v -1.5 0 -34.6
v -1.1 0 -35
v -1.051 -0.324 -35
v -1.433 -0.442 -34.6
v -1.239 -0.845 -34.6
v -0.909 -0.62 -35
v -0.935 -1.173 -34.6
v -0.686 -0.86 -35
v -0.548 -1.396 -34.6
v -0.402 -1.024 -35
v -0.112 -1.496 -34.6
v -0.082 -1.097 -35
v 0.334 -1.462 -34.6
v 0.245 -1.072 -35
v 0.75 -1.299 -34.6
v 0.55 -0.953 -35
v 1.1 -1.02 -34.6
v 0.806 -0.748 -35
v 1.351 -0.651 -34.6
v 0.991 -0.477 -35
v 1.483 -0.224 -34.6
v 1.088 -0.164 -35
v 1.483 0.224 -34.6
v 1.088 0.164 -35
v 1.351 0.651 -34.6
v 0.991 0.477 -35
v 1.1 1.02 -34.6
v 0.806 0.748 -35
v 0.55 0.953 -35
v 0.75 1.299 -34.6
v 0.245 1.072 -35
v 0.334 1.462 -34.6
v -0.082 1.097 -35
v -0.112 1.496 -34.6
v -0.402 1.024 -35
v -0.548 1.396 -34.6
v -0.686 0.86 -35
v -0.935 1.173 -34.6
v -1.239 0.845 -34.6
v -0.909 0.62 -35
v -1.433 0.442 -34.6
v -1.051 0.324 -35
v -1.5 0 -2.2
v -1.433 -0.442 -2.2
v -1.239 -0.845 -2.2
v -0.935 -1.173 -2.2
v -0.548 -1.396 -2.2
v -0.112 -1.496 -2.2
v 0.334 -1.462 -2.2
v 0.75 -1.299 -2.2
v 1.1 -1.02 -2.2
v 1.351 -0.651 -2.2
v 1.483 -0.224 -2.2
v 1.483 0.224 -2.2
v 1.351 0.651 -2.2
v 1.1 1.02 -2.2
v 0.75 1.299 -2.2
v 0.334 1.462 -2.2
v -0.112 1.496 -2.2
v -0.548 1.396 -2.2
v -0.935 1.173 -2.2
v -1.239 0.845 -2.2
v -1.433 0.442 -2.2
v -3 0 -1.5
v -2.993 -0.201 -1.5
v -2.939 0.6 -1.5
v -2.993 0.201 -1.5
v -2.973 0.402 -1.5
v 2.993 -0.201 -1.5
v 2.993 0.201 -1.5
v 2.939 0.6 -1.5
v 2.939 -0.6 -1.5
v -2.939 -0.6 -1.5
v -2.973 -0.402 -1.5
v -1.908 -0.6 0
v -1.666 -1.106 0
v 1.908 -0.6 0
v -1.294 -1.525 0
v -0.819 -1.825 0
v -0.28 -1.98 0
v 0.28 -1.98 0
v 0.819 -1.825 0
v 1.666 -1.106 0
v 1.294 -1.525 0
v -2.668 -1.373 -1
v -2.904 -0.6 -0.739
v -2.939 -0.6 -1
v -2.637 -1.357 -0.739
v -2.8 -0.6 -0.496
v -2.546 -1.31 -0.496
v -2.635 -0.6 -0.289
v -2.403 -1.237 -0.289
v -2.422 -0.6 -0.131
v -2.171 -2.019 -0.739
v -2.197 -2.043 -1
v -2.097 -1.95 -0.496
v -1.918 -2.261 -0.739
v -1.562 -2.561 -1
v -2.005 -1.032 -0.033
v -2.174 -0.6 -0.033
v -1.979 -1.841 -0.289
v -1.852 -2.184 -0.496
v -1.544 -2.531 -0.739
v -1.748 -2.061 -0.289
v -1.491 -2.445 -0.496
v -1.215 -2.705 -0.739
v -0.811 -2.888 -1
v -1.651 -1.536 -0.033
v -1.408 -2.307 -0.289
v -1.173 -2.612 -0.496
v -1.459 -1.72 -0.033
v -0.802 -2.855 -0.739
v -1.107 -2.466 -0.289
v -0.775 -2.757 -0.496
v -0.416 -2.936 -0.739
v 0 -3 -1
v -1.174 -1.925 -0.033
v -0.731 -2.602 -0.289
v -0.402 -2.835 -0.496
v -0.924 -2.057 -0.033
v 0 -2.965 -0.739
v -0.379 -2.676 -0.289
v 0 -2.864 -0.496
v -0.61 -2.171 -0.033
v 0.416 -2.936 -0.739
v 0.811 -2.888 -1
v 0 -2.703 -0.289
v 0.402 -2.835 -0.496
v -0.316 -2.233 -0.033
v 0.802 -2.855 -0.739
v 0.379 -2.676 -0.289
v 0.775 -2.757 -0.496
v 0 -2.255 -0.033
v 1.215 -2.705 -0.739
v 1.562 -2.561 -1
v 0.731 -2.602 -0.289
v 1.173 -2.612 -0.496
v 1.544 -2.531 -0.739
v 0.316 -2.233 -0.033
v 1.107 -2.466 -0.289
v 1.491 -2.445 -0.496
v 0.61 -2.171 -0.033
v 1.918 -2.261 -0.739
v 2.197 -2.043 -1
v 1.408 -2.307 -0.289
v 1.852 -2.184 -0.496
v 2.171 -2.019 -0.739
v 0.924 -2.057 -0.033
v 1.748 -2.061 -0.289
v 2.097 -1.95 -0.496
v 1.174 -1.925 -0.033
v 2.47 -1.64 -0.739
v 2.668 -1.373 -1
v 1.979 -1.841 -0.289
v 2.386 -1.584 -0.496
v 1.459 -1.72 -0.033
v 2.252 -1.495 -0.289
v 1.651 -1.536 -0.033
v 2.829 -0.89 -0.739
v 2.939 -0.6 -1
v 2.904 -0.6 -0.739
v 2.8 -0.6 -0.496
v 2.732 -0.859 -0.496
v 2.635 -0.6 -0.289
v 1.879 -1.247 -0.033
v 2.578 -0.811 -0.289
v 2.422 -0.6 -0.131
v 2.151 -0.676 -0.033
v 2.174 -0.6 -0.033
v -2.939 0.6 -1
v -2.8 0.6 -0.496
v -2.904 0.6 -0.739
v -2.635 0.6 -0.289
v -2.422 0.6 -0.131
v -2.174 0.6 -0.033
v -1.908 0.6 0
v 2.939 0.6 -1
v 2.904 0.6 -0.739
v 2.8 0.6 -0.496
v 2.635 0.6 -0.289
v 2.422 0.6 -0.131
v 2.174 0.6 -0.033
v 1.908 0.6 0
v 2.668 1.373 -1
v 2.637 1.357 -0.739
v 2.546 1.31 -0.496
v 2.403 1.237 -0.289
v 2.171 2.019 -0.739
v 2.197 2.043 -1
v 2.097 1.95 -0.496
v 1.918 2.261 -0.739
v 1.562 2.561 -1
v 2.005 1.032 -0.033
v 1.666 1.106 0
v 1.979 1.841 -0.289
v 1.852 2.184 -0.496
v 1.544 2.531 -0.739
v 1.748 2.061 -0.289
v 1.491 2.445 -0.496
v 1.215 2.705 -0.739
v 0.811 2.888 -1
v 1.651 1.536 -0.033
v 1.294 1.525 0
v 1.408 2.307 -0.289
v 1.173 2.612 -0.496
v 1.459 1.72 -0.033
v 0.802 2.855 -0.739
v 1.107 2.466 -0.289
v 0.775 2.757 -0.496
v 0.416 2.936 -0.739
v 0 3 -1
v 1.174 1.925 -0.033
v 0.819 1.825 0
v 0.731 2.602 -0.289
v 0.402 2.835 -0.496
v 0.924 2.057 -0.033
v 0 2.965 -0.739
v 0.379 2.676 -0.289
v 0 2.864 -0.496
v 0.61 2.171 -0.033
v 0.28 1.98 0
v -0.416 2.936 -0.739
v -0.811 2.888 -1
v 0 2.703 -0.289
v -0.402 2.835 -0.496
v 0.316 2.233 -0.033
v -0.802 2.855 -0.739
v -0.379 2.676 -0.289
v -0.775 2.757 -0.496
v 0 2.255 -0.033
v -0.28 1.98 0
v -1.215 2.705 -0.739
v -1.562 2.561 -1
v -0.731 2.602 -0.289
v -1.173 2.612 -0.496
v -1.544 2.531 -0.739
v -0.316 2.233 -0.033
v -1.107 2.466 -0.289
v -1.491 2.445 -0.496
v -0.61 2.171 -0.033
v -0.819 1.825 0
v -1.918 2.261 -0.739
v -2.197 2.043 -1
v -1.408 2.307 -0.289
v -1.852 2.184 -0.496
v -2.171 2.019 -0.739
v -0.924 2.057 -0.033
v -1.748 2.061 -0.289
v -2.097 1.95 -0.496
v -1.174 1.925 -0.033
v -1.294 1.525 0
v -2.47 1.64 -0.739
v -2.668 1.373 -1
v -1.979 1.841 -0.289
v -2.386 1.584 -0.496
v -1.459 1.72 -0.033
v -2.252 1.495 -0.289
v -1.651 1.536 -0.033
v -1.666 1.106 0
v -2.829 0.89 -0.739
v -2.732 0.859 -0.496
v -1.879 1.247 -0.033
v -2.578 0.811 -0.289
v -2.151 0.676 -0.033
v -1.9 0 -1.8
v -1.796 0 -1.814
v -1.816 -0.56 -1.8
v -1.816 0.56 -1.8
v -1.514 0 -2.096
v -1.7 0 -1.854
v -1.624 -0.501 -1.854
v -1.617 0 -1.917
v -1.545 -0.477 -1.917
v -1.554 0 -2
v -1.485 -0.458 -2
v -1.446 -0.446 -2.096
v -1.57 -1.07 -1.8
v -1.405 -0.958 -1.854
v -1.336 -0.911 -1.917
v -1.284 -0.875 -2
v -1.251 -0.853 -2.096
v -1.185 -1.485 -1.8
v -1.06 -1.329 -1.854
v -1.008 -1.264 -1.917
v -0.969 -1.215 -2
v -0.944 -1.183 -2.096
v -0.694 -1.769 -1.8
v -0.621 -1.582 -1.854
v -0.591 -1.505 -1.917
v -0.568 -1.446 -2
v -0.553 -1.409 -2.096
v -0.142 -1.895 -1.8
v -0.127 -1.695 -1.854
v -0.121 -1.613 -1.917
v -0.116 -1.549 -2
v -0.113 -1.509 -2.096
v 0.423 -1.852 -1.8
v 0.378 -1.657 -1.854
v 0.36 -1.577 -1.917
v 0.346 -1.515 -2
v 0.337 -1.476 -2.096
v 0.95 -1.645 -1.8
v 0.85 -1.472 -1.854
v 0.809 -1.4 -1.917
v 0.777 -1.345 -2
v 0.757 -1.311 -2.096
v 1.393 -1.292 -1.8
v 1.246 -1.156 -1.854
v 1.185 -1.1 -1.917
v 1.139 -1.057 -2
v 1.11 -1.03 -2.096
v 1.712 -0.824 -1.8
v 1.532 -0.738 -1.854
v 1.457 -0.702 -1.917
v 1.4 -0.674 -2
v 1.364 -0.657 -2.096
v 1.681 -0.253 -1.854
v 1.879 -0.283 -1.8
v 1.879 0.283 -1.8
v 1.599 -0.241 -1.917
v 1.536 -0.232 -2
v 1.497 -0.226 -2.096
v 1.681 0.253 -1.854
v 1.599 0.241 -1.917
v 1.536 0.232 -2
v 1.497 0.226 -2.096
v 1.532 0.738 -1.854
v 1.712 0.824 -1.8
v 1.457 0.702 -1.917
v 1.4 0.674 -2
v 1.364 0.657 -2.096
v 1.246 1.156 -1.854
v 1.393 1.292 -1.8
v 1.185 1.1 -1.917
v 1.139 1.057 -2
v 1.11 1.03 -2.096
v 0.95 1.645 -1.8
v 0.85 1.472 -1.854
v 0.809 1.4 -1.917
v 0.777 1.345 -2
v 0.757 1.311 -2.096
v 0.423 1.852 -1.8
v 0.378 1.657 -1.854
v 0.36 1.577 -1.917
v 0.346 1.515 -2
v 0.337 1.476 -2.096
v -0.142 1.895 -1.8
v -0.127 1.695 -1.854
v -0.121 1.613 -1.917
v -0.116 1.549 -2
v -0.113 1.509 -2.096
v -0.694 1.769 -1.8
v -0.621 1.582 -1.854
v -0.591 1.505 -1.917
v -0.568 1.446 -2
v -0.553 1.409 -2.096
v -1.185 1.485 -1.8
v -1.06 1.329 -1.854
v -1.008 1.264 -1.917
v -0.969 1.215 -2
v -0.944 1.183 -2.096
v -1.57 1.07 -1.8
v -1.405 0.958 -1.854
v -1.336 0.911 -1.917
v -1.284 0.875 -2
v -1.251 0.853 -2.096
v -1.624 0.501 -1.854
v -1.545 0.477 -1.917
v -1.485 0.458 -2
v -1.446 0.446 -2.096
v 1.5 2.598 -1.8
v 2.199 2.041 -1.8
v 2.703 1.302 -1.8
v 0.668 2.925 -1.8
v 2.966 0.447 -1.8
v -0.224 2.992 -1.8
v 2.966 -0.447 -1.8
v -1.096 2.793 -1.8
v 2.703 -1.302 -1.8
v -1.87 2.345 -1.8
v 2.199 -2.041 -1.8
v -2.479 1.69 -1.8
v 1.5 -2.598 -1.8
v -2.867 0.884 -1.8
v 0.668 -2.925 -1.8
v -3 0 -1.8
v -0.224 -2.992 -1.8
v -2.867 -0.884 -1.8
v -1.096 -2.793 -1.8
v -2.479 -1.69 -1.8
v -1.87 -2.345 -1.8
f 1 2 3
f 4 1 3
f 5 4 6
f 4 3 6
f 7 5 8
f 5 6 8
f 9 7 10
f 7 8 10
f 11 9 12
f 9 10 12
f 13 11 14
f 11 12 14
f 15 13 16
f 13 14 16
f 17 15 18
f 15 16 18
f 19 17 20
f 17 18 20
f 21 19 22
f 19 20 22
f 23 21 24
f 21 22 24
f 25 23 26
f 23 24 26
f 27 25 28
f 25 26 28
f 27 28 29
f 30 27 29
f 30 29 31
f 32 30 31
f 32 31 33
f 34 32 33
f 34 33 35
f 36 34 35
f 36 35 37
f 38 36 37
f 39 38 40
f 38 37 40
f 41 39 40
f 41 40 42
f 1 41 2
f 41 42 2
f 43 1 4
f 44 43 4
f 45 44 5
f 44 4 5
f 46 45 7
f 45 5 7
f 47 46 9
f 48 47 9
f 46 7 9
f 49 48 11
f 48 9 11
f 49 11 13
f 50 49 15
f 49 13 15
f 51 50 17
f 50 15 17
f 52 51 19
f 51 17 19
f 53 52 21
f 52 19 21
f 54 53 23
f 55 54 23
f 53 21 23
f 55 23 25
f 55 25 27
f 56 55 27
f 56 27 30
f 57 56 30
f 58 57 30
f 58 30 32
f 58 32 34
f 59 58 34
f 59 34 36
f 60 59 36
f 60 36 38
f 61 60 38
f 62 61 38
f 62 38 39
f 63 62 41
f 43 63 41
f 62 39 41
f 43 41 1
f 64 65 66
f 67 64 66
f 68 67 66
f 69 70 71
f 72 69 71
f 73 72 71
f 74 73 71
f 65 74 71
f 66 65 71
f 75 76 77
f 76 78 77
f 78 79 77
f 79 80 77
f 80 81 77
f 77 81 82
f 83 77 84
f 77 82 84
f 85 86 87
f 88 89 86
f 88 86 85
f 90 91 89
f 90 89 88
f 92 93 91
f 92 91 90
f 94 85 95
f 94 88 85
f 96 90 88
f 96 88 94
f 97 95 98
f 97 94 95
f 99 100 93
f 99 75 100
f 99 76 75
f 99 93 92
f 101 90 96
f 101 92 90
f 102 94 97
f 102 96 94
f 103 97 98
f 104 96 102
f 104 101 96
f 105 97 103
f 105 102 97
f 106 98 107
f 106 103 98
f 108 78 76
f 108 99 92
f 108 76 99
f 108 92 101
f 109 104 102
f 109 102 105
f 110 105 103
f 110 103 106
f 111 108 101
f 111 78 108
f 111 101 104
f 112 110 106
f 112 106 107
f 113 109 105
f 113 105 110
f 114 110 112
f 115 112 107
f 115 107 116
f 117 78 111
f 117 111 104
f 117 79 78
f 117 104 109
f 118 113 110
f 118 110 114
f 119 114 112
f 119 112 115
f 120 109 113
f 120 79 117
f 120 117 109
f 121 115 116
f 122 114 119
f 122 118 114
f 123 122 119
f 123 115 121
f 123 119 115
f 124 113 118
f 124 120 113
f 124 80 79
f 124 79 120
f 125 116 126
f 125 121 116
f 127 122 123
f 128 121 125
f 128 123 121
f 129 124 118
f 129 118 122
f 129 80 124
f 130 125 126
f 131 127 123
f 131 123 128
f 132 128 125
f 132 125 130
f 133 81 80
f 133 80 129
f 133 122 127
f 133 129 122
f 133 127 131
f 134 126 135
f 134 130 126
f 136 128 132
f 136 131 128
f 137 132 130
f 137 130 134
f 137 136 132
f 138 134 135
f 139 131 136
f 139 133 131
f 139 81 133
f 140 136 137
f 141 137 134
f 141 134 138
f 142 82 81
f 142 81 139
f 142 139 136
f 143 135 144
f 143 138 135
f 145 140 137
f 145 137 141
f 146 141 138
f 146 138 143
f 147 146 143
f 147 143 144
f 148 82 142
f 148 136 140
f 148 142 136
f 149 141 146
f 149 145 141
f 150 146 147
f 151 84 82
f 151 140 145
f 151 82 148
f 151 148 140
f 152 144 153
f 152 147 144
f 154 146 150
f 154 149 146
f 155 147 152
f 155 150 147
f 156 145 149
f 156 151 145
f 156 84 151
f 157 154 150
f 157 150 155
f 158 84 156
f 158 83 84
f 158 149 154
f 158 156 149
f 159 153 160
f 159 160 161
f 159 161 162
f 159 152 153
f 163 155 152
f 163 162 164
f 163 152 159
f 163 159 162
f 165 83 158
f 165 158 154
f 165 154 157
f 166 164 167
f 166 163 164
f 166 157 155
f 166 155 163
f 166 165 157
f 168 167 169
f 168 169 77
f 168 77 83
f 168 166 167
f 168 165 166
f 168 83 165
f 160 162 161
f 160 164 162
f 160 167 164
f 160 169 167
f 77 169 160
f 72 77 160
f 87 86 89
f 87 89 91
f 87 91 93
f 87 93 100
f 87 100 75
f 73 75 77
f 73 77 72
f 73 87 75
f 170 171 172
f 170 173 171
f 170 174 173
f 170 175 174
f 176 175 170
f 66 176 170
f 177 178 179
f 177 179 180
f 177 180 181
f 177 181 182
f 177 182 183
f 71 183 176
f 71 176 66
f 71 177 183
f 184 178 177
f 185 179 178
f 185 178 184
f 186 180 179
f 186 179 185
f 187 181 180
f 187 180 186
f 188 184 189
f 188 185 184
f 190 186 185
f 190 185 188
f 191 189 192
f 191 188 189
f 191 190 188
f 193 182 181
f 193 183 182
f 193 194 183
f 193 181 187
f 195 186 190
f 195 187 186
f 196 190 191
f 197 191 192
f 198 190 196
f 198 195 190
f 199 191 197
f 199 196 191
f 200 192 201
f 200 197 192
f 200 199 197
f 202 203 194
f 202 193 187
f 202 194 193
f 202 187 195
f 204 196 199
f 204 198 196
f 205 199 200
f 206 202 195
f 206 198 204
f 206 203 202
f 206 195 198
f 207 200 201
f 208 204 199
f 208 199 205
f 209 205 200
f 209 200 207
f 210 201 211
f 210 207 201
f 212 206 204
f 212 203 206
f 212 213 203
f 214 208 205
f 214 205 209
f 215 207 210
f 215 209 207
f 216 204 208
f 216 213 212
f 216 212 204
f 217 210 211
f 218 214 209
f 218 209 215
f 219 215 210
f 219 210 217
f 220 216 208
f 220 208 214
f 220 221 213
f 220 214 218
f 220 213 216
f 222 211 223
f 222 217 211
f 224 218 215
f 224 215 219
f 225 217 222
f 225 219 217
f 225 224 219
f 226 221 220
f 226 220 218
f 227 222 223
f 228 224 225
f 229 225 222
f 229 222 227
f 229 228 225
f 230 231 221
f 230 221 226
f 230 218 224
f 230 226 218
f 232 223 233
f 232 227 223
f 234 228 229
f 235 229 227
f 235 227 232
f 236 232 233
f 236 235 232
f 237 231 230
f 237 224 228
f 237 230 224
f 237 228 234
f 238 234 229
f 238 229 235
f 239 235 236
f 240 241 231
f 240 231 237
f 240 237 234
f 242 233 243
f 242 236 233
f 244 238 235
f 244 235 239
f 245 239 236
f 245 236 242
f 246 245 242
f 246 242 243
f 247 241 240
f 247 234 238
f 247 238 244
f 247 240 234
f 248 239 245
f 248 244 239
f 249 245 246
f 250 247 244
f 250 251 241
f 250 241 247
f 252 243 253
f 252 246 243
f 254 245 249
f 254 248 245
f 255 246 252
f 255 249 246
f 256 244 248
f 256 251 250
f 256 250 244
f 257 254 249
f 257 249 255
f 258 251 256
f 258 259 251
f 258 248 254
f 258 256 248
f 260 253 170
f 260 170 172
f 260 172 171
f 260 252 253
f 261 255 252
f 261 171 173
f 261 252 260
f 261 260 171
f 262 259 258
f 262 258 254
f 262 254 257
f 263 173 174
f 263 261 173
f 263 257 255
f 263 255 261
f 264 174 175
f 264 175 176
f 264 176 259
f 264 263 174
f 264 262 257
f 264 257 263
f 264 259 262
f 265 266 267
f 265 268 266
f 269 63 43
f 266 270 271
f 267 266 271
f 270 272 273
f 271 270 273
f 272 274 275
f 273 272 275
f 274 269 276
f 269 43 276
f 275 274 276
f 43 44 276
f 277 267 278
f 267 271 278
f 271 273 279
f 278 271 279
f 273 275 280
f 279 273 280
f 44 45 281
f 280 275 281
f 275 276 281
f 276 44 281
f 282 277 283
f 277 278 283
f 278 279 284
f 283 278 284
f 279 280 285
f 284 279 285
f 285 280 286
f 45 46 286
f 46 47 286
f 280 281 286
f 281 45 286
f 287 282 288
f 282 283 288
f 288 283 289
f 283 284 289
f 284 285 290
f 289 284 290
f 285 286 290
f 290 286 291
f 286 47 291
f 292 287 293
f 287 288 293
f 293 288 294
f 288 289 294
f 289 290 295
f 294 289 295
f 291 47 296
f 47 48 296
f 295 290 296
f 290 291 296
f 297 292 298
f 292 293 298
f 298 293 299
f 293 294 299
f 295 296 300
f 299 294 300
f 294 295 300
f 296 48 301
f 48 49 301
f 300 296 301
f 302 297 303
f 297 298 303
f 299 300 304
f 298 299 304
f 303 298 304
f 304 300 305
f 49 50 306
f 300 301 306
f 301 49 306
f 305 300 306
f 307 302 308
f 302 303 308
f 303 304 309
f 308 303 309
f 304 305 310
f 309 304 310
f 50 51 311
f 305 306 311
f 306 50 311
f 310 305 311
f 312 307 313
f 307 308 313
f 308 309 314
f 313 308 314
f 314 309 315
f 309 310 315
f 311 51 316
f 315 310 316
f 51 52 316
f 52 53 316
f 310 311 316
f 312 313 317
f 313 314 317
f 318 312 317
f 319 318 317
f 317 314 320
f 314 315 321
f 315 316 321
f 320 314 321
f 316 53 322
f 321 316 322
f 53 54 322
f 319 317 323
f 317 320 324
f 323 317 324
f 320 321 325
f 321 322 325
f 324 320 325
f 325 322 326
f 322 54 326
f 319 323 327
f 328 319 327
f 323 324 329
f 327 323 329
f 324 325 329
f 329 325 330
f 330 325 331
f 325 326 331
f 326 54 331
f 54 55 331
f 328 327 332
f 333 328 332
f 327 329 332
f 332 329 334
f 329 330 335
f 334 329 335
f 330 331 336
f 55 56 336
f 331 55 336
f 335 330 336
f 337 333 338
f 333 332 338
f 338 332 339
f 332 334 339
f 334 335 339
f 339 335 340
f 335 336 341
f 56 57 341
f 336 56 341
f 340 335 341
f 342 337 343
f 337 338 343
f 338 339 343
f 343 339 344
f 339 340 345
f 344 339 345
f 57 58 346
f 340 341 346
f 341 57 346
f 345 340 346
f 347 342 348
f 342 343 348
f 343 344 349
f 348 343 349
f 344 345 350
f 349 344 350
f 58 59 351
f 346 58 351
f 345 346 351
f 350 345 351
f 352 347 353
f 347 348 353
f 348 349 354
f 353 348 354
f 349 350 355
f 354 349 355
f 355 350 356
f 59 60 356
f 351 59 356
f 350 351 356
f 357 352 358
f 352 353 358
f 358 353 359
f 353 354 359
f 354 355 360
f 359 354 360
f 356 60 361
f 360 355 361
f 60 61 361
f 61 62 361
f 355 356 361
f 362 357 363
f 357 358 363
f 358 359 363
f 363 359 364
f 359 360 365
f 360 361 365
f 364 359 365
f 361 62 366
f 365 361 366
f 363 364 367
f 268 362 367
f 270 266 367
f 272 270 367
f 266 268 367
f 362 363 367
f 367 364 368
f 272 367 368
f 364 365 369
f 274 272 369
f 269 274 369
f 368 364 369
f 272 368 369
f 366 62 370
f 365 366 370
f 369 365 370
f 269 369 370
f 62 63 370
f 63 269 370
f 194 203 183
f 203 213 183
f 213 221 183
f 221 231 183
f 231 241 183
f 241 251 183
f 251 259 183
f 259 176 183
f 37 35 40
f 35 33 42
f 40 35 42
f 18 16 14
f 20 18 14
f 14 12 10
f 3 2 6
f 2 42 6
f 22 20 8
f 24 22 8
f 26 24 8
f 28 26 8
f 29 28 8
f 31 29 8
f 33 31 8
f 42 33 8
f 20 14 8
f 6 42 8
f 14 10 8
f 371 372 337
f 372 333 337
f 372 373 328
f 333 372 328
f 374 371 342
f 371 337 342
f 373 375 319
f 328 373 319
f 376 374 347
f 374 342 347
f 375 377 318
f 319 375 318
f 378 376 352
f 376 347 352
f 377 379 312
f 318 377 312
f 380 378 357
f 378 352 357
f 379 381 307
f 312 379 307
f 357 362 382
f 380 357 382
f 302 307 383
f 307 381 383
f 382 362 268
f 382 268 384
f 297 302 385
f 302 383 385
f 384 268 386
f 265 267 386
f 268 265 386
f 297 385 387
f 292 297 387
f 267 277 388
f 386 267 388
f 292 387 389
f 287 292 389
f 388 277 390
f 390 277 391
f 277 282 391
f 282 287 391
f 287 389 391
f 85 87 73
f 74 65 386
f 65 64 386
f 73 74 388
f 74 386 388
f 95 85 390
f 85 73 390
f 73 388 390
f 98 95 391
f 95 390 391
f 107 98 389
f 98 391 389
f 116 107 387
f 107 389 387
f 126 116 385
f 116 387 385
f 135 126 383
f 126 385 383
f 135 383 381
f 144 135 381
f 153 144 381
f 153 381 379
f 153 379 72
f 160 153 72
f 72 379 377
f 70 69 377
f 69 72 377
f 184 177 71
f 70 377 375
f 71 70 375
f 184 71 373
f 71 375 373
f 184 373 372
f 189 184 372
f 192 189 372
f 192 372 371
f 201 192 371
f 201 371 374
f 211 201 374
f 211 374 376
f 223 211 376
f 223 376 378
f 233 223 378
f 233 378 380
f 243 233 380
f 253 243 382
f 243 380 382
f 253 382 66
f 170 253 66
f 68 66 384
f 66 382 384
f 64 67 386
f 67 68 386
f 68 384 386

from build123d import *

# Parameters (mm, degrees)
SKETCH_2_W               = 1.5
SKETCH_2_H               = 1.2
CUT_EXTRUDE_1_DEPTH      = 4
CUT_EXTRUDE_1_DEPTH_BACK = 4
CHAMFER_1_SIZE           = 0.4
FILLET_1_R               = 1
FILLET_2_R               = 0.4


with BuildPart() as part:
    # Эскиз1 → Повернуть1 (revolve)
    with BuildSketch(Plane(origin=(0, 0, 0), x_dir=(1, 0, 0), z_dir=(0, 1, 0))):
        Polygon((0, 0), (-3, 0), (-3, 1.8), (-1.5, 1.8), (-1.5, 35), (0, 35), align=None)
    revolve(axis=Axis((0, 0, -35), (0, 0, 1)))

    # Эскиз2 → Вырез-Вытянуть1 (cut, two sides)
    with BuildSketch(Plane(origin=(0, 0, 0), x_dir=(0, 0, -1), z_dir=(1, 0, 0))) as cut_extrude_1_sk:
        with Locations((0.75, 0)):
            Rectangle(SKETCH_2_W, SKETCH_2_H)
    extrude(amount=CUT_EXTRUDE_1_DEPTH, mode=Mode.SUBTRACT)
    extrude(cut_extrude_1_sk.sketch, amount=-CUT_EXTRUDE_1_DEPTH_BACK, mode=Mode.SUBTRACT)

    # Фаска1
    chamfer_1_edges = [part.edges().sort_by_distance(p)[0] for p in [
        (1.5, 0, -35),
    ]]
    chamfer(chamfer_1_edges, length=CHAMFER_1_SIZE)

    # Скругление1
    fillet_1_edges = [part.edges().sort_by_distance(p)[0] for p in [
        (0, 3, 0),
        (0, -3, 0),
    ]]
    fillet(fillet_1_edges, radius=FILLET_1_R)

    # Скругление2
    fillet_2_edges = [part.edges().sort_by_distance(p)[0] for p in [
        (1.5, 0, -1.8),
    ]]
    fillet(fillet_2_edges, radius=FILLET_2_R)


solid = part.part
